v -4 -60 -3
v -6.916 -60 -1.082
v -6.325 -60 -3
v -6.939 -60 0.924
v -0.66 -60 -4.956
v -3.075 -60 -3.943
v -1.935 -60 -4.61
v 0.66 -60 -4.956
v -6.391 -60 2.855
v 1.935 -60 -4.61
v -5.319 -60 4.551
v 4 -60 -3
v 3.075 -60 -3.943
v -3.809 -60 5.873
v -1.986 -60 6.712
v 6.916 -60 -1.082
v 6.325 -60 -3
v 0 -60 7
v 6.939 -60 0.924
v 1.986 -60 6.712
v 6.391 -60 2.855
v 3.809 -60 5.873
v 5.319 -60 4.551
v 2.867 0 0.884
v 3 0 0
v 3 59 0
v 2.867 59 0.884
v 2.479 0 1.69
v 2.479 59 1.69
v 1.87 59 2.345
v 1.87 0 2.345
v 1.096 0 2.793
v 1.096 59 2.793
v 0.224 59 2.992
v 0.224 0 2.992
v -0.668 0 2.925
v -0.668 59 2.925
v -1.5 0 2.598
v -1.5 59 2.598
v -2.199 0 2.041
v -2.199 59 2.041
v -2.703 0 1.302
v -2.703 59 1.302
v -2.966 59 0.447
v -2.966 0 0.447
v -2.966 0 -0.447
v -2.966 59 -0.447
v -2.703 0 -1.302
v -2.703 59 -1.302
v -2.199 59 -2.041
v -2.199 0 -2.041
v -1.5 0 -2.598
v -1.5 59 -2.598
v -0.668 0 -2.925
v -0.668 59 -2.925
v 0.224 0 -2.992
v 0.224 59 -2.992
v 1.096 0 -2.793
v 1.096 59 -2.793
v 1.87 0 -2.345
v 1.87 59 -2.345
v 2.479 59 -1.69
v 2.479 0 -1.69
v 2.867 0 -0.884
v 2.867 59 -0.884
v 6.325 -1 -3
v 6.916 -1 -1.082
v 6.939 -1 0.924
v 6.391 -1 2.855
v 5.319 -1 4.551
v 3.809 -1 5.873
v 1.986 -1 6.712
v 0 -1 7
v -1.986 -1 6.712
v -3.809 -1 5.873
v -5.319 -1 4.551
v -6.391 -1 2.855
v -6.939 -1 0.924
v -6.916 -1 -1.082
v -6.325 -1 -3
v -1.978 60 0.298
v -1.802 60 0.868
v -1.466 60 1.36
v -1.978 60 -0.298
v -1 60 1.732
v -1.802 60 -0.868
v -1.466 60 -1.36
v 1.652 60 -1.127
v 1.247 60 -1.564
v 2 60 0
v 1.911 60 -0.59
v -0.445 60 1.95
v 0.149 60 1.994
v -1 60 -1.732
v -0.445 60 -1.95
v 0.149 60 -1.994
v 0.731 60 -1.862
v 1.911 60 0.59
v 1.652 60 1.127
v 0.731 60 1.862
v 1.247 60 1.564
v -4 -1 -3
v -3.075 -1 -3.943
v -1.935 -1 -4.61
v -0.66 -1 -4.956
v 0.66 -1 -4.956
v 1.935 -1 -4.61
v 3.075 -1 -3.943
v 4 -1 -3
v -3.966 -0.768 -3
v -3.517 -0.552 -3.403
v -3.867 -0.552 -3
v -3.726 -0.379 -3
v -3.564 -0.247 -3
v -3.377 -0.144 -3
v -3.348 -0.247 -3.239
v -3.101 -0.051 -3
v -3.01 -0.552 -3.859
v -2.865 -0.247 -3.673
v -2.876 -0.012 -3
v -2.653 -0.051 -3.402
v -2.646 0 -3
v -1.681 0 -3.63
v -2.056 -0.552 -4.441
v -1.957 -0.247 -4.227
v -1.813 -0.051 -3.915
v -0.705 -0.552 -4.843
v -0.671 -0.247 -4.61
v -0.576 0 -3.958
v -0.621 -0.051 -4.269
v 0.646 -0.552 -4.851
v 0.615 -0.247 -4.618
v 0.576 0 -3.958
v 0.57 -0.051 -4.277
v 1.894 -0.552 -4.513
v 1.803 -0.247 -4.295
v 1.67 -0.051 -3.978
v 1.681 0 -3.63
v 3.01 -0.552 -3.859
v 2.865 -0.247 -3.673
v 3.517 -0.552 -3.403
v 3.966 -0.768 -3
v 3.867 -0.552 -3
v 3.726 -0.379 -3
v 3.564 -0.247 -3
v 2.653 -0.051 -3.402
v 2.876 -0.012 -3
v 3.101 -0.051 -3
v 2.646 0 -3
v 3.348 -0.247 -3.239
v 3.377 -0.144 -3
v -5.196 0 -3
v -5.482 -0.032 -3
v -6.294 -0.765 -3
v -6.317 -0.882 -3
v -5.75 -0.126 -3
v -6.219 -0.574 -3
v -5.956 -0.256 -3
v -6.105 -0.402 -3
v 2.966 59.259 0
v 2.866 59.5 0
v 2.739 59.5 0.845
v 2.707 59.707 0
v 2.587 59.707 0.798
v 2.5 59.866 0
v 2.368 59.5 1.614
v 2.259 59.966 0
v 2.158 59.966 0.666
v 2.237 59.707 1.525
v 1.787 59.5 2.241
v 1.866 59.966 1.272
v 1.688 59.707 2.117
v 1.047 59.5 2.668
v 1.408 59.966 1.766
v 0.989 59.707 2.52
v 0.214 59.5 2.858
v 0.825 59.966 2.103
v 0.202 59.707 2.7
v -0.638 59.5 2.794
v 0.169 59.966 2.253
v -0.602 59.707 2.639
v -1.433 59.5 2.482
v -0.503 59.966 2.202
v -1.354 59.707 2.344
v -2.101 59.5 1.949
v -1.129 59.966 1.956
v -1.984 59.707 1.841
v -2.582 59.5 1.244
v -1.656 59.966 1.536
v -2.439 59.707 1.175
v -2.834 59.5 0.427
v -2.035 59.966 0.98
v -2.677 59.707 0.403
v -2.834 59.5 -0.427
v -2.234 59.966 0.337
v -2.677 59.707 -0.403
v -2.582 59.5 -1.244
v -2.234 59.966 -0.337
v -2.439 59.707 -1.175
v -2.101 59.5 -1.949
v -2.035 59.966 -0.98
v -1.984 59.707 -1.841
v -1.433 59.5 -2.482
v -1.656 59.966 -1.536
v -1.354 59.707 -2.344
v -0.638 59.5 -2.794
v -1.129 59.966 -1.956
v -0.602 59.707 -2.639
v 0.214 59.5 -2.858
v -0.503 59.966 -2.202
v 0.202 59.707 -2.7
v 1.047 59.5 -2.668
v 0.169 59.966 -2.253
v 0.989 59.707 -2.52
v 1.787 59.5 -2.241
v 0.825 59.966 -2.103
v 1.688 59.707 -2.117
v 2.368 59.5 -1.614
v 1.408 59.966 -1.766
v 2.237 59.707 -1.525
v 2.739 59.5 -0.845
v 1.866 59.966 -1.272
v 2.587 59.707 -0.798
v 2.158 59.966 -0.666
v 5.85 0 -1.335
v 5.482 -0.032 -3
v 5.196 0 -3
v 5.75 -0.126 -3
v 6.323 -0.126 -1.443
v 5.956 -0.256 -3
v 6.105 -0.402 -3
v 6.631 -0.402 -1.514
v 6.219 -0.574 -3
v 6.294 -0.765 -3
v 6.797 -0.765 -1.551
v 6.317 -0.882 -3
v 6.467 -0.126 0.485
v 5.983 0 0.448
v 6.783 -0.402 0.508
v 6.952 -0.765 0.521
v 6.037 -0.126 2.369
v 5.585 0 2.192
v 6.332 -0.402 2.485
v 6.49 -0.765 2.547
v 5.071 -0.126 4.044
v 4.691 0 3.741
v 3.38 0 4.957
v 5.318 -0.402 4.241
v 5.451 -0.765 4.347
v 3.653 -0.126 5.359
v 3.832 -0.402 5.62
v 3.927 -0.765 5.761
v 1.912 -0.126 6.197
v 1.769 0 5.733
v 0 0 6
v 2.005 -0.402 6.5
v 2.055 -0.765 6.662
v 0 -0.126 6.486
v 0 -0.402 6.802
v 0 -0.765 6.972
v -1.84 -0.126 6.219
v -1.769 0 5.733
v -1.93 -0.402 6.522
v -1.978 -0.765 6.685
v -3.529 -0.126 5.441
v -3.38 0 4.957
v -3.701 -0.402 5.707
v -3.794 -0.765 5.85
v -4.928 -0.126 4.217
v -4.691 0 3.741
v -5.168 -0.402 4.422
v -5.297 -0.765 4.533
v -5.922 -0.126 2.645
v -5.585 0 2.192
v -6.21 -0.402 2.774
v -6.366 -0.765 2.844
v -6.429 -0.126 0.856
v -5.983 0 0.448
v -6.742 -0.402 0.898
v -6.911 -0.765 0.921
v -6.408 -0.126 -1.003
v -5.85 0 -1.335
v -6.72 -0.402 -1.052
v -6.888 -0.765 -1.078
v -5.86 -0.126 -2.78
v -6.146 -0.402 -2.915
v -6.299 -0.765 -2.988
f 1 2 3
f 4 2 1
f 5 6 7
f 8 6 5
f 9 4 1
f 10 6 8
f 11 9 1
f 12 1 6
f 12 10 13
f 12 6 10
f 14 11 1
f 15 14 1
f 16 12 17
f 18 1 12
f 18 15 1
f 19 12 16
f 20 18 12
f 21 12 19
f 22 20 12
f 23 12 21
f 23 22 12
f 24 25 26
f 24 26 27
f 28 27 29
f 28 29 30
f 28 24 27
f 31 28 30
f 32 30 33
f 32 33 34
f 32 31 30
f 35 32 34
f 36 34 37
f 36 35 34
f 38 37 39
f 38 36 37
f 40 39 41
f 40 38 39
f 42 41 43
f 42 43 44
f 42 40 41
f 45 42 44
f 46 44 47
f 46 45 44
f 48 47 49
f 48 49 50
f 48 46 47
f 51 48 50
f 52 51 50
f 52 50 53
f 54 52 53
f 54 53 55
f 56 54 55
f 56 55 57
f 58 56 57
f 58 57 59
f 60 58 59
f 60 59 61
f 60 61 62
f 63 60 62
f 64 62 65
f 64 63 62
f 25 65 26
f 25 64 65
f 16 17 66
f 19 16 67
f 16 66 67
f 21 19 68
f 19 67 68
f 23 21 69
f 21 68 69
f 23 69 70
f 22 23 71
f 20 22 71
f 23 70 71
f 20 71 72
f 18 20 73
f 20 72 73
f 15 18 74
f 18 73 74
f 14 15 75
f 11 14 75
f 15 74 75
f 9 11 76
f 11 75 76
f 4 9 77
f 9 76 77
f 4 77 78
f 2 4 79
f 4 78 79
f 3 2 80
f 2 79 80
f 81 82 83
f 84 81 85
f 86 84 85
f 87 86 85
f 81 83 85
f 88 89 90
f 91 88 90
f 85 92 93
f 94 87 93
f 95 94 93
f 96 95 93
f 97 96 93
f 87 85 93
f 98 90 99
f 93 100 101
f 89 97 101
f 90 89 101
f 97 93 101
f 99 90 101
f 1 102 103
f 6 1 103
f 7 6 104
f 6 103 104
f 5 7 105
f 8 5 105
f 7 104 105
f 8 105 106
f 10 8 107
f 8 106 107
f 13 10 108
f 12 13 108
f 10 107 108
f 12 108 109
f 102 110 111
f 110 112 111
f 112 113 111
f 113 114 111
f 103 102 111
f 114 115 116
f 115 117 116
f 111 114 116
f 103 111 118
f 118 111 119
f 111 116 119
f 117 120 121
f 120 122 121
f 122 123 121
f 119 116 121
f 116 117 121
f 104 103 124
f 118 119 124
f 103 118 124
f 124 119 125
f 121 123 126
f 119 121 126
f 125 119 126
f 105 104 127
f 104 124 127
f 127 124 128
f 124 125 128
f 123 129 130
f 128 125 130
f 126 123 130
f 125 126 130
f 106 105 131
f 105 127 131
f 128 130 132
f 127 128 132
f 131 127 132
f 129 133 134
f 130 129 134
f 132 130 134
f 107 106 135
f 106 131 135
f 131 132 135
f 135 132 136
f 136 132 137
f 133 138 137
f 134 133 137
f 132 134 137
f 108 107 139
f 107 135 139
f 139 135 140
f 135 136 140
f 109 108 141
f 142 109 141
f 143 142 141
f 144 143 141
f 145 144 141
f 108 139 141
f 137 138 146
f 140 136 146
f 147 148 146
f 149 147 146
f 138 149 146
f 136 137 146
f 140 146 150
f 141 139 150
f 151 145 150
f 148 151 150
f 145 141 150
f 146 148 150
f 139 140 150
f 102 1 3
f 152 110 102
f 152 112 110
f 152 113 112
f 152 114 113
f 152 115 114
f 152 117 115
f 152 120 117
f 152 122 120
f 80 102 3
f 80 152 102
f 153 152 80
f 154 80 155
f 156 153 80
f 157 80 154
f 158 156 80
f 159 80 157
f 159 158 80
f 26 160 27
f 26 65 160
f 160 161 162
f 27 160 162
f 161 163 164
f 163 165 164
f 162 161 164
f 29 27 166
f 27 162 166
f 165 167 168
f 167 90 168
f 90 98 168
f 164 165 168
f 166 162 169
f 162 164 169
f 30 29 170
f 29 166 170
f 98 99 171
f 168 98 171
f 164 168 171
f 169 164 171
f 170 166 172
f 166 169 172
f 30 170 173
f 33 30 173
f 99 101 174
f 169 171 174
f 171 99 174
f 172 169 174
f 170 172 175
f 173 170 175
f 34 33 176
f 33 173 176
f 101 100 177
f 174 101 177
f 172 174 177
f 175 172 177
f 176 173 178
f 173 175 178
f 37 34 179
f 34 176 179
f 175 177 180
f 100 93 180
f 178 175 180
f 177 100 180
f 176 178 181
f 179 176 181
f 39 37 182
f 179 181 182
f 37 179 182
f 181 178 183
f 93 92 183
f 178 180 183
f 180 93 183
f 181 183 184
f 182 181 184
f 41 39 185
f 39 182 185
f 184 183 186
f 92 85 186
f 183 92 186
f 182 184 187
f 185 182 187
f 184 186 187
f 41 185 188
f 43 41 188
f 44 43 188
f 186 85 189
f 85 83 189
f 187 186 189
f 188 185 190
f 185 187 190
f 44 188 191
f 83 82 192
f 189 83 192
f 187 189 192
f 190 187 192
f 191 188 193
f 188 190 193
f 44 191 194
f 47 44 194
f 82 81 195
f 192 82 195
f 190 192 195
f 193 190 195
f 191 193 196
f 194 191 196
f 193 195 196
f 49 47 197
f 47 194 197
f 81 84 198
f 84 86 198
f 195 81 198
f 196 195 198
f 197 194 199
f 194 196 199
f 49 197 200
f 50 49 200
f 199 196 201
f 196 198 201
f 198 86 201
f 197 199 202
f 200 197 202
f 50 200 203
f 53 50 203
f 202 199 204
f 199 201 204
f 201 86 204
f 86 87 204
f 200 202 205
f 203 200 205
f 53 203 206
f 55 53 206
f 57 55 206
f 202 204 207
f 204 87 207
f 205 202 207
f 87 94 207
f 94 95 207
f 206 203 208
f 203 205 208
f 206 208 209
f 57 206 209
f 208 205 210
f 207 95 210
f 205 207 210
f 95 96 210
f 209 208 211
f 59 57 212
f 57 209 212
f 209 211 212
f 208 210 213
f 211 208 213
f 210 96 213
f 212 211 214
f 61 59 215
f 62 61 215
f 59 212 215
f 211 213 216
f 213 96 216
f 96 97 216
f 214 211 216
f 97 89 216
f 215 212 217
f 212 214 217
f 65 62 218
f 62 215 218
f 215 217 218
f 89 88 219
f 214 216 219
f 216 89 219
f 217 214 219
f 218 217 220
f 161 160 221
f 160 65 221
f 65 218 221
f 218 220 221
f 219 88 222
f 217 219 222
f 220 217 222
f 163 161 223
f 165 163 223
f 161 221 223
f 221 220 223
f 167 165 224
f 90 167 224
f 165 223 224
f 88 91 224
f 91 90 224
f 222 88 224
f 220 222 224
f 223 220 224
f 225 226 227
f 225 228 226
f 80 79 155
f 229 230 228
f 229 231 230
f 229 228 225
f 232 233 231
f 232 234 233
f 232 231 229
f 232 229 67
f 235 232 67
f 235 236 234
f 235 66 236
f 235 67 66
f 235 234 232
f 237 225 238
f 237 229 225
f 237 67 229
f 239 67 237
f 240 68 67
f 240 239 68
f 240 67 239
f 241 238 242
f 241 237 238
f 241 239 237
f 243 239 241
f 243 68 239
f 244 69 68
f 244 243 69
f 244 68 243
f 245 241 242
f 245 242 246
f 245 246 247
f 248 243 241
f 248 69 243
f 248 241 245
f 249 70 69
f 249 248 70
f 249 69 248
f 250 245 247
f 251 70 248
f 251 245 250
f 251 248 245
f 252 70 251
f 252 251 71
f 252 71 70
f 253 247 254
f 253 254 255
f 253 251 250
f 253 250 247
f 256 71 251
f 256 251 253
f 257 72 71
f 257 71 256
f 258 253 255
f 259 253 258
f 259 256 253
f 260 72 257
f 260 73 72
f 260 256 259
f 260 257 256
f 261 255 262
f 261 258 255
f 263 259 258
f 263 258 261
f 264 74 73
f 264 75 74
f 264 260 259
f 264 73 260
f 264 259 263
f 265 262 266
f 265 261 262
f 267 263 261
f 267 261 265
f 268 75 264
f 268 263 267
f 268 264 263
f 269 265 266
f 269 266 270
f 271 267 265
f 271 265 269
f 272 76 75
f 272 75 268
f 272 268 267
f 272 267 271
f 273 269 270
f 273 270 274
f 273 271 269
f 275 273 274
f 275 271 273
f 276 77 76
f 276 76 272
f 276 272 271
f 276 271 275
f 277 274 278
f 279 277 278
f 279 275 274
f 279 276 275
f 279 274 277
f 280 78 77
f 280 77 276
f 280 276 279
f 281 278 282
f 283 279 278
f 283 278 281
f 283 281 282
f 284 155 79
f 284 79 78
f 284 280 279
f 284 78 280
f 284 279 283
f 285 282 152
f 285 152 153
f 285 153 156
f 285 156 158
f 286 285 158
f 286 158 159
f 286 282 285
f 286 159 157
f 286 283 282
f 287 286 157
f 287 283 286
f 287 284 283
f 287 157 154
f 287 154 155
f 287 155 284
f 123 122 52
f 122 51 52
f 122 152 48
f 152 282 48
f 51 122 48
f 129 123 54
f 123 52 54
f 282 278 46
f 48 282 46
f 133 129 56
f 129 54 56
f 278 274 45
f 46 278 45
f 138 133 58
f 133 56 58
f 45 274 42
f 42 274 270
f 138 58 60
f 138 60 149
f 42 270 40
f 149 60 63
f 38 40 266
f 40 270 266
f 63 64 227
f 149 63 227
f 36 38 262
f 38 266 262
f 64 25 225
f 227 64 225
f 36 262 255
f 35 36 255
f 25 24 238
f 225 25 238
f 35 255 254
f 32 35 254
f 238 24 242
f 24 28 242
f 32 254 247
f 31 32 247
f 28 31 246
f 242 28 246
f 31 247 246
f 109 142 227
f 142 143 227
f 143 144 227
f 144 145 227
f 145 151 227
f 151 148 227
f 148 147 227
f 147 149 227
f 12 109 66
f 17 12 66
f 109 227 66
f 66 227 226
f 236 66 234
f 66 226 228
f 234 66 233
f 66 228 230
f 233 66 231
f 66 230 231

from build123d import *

# Parameters (mm, degrees)
PAD_DEPTH    = 60
SKETCH001_R  = 3
PAD001_DEPTH = 60
FILLET_R     = 1
FILLET001_R  = 1


with BuildPart() as part:
    # Sketch → Pad (new body)
    with BuildSketch(Plane.XZ):
        with BuildLine():
            ThreePointArc((-4, -3), (0, -5), (4, -3))
            Line((4, -3), (6.324555, -3))
            ThreePointArc((6.324555, -3), (0, 7), (-6.324555, -3))
            Line((-4, -3), (-6.324555, -3))
        make_face()
    extrude(amount=PAD_DEPTH)

    # Sketch001 → Pad001 (join)
    with BuildSketch(Plane.XZ):
        Circle(SKETCH001_R)
    extrude(amount=-PAD001_DEPTH)

    # Fillet
    fillet_edges = [part.edges().sort_by_distance(p)[0] for p in [
        (0, 0, 7),
        (0, 0, -5),
    ]]
    fillet(fillet_edges, radius=FILLET_R)

    # Fillet001
    fillet001_edges = [part.edges().sort_by_distance(p)[0] for p in [
        (-3, 60, 0),
    ]]
    fillet(fillet001_edges, radius=FILLET001_R)


solid = part.part
